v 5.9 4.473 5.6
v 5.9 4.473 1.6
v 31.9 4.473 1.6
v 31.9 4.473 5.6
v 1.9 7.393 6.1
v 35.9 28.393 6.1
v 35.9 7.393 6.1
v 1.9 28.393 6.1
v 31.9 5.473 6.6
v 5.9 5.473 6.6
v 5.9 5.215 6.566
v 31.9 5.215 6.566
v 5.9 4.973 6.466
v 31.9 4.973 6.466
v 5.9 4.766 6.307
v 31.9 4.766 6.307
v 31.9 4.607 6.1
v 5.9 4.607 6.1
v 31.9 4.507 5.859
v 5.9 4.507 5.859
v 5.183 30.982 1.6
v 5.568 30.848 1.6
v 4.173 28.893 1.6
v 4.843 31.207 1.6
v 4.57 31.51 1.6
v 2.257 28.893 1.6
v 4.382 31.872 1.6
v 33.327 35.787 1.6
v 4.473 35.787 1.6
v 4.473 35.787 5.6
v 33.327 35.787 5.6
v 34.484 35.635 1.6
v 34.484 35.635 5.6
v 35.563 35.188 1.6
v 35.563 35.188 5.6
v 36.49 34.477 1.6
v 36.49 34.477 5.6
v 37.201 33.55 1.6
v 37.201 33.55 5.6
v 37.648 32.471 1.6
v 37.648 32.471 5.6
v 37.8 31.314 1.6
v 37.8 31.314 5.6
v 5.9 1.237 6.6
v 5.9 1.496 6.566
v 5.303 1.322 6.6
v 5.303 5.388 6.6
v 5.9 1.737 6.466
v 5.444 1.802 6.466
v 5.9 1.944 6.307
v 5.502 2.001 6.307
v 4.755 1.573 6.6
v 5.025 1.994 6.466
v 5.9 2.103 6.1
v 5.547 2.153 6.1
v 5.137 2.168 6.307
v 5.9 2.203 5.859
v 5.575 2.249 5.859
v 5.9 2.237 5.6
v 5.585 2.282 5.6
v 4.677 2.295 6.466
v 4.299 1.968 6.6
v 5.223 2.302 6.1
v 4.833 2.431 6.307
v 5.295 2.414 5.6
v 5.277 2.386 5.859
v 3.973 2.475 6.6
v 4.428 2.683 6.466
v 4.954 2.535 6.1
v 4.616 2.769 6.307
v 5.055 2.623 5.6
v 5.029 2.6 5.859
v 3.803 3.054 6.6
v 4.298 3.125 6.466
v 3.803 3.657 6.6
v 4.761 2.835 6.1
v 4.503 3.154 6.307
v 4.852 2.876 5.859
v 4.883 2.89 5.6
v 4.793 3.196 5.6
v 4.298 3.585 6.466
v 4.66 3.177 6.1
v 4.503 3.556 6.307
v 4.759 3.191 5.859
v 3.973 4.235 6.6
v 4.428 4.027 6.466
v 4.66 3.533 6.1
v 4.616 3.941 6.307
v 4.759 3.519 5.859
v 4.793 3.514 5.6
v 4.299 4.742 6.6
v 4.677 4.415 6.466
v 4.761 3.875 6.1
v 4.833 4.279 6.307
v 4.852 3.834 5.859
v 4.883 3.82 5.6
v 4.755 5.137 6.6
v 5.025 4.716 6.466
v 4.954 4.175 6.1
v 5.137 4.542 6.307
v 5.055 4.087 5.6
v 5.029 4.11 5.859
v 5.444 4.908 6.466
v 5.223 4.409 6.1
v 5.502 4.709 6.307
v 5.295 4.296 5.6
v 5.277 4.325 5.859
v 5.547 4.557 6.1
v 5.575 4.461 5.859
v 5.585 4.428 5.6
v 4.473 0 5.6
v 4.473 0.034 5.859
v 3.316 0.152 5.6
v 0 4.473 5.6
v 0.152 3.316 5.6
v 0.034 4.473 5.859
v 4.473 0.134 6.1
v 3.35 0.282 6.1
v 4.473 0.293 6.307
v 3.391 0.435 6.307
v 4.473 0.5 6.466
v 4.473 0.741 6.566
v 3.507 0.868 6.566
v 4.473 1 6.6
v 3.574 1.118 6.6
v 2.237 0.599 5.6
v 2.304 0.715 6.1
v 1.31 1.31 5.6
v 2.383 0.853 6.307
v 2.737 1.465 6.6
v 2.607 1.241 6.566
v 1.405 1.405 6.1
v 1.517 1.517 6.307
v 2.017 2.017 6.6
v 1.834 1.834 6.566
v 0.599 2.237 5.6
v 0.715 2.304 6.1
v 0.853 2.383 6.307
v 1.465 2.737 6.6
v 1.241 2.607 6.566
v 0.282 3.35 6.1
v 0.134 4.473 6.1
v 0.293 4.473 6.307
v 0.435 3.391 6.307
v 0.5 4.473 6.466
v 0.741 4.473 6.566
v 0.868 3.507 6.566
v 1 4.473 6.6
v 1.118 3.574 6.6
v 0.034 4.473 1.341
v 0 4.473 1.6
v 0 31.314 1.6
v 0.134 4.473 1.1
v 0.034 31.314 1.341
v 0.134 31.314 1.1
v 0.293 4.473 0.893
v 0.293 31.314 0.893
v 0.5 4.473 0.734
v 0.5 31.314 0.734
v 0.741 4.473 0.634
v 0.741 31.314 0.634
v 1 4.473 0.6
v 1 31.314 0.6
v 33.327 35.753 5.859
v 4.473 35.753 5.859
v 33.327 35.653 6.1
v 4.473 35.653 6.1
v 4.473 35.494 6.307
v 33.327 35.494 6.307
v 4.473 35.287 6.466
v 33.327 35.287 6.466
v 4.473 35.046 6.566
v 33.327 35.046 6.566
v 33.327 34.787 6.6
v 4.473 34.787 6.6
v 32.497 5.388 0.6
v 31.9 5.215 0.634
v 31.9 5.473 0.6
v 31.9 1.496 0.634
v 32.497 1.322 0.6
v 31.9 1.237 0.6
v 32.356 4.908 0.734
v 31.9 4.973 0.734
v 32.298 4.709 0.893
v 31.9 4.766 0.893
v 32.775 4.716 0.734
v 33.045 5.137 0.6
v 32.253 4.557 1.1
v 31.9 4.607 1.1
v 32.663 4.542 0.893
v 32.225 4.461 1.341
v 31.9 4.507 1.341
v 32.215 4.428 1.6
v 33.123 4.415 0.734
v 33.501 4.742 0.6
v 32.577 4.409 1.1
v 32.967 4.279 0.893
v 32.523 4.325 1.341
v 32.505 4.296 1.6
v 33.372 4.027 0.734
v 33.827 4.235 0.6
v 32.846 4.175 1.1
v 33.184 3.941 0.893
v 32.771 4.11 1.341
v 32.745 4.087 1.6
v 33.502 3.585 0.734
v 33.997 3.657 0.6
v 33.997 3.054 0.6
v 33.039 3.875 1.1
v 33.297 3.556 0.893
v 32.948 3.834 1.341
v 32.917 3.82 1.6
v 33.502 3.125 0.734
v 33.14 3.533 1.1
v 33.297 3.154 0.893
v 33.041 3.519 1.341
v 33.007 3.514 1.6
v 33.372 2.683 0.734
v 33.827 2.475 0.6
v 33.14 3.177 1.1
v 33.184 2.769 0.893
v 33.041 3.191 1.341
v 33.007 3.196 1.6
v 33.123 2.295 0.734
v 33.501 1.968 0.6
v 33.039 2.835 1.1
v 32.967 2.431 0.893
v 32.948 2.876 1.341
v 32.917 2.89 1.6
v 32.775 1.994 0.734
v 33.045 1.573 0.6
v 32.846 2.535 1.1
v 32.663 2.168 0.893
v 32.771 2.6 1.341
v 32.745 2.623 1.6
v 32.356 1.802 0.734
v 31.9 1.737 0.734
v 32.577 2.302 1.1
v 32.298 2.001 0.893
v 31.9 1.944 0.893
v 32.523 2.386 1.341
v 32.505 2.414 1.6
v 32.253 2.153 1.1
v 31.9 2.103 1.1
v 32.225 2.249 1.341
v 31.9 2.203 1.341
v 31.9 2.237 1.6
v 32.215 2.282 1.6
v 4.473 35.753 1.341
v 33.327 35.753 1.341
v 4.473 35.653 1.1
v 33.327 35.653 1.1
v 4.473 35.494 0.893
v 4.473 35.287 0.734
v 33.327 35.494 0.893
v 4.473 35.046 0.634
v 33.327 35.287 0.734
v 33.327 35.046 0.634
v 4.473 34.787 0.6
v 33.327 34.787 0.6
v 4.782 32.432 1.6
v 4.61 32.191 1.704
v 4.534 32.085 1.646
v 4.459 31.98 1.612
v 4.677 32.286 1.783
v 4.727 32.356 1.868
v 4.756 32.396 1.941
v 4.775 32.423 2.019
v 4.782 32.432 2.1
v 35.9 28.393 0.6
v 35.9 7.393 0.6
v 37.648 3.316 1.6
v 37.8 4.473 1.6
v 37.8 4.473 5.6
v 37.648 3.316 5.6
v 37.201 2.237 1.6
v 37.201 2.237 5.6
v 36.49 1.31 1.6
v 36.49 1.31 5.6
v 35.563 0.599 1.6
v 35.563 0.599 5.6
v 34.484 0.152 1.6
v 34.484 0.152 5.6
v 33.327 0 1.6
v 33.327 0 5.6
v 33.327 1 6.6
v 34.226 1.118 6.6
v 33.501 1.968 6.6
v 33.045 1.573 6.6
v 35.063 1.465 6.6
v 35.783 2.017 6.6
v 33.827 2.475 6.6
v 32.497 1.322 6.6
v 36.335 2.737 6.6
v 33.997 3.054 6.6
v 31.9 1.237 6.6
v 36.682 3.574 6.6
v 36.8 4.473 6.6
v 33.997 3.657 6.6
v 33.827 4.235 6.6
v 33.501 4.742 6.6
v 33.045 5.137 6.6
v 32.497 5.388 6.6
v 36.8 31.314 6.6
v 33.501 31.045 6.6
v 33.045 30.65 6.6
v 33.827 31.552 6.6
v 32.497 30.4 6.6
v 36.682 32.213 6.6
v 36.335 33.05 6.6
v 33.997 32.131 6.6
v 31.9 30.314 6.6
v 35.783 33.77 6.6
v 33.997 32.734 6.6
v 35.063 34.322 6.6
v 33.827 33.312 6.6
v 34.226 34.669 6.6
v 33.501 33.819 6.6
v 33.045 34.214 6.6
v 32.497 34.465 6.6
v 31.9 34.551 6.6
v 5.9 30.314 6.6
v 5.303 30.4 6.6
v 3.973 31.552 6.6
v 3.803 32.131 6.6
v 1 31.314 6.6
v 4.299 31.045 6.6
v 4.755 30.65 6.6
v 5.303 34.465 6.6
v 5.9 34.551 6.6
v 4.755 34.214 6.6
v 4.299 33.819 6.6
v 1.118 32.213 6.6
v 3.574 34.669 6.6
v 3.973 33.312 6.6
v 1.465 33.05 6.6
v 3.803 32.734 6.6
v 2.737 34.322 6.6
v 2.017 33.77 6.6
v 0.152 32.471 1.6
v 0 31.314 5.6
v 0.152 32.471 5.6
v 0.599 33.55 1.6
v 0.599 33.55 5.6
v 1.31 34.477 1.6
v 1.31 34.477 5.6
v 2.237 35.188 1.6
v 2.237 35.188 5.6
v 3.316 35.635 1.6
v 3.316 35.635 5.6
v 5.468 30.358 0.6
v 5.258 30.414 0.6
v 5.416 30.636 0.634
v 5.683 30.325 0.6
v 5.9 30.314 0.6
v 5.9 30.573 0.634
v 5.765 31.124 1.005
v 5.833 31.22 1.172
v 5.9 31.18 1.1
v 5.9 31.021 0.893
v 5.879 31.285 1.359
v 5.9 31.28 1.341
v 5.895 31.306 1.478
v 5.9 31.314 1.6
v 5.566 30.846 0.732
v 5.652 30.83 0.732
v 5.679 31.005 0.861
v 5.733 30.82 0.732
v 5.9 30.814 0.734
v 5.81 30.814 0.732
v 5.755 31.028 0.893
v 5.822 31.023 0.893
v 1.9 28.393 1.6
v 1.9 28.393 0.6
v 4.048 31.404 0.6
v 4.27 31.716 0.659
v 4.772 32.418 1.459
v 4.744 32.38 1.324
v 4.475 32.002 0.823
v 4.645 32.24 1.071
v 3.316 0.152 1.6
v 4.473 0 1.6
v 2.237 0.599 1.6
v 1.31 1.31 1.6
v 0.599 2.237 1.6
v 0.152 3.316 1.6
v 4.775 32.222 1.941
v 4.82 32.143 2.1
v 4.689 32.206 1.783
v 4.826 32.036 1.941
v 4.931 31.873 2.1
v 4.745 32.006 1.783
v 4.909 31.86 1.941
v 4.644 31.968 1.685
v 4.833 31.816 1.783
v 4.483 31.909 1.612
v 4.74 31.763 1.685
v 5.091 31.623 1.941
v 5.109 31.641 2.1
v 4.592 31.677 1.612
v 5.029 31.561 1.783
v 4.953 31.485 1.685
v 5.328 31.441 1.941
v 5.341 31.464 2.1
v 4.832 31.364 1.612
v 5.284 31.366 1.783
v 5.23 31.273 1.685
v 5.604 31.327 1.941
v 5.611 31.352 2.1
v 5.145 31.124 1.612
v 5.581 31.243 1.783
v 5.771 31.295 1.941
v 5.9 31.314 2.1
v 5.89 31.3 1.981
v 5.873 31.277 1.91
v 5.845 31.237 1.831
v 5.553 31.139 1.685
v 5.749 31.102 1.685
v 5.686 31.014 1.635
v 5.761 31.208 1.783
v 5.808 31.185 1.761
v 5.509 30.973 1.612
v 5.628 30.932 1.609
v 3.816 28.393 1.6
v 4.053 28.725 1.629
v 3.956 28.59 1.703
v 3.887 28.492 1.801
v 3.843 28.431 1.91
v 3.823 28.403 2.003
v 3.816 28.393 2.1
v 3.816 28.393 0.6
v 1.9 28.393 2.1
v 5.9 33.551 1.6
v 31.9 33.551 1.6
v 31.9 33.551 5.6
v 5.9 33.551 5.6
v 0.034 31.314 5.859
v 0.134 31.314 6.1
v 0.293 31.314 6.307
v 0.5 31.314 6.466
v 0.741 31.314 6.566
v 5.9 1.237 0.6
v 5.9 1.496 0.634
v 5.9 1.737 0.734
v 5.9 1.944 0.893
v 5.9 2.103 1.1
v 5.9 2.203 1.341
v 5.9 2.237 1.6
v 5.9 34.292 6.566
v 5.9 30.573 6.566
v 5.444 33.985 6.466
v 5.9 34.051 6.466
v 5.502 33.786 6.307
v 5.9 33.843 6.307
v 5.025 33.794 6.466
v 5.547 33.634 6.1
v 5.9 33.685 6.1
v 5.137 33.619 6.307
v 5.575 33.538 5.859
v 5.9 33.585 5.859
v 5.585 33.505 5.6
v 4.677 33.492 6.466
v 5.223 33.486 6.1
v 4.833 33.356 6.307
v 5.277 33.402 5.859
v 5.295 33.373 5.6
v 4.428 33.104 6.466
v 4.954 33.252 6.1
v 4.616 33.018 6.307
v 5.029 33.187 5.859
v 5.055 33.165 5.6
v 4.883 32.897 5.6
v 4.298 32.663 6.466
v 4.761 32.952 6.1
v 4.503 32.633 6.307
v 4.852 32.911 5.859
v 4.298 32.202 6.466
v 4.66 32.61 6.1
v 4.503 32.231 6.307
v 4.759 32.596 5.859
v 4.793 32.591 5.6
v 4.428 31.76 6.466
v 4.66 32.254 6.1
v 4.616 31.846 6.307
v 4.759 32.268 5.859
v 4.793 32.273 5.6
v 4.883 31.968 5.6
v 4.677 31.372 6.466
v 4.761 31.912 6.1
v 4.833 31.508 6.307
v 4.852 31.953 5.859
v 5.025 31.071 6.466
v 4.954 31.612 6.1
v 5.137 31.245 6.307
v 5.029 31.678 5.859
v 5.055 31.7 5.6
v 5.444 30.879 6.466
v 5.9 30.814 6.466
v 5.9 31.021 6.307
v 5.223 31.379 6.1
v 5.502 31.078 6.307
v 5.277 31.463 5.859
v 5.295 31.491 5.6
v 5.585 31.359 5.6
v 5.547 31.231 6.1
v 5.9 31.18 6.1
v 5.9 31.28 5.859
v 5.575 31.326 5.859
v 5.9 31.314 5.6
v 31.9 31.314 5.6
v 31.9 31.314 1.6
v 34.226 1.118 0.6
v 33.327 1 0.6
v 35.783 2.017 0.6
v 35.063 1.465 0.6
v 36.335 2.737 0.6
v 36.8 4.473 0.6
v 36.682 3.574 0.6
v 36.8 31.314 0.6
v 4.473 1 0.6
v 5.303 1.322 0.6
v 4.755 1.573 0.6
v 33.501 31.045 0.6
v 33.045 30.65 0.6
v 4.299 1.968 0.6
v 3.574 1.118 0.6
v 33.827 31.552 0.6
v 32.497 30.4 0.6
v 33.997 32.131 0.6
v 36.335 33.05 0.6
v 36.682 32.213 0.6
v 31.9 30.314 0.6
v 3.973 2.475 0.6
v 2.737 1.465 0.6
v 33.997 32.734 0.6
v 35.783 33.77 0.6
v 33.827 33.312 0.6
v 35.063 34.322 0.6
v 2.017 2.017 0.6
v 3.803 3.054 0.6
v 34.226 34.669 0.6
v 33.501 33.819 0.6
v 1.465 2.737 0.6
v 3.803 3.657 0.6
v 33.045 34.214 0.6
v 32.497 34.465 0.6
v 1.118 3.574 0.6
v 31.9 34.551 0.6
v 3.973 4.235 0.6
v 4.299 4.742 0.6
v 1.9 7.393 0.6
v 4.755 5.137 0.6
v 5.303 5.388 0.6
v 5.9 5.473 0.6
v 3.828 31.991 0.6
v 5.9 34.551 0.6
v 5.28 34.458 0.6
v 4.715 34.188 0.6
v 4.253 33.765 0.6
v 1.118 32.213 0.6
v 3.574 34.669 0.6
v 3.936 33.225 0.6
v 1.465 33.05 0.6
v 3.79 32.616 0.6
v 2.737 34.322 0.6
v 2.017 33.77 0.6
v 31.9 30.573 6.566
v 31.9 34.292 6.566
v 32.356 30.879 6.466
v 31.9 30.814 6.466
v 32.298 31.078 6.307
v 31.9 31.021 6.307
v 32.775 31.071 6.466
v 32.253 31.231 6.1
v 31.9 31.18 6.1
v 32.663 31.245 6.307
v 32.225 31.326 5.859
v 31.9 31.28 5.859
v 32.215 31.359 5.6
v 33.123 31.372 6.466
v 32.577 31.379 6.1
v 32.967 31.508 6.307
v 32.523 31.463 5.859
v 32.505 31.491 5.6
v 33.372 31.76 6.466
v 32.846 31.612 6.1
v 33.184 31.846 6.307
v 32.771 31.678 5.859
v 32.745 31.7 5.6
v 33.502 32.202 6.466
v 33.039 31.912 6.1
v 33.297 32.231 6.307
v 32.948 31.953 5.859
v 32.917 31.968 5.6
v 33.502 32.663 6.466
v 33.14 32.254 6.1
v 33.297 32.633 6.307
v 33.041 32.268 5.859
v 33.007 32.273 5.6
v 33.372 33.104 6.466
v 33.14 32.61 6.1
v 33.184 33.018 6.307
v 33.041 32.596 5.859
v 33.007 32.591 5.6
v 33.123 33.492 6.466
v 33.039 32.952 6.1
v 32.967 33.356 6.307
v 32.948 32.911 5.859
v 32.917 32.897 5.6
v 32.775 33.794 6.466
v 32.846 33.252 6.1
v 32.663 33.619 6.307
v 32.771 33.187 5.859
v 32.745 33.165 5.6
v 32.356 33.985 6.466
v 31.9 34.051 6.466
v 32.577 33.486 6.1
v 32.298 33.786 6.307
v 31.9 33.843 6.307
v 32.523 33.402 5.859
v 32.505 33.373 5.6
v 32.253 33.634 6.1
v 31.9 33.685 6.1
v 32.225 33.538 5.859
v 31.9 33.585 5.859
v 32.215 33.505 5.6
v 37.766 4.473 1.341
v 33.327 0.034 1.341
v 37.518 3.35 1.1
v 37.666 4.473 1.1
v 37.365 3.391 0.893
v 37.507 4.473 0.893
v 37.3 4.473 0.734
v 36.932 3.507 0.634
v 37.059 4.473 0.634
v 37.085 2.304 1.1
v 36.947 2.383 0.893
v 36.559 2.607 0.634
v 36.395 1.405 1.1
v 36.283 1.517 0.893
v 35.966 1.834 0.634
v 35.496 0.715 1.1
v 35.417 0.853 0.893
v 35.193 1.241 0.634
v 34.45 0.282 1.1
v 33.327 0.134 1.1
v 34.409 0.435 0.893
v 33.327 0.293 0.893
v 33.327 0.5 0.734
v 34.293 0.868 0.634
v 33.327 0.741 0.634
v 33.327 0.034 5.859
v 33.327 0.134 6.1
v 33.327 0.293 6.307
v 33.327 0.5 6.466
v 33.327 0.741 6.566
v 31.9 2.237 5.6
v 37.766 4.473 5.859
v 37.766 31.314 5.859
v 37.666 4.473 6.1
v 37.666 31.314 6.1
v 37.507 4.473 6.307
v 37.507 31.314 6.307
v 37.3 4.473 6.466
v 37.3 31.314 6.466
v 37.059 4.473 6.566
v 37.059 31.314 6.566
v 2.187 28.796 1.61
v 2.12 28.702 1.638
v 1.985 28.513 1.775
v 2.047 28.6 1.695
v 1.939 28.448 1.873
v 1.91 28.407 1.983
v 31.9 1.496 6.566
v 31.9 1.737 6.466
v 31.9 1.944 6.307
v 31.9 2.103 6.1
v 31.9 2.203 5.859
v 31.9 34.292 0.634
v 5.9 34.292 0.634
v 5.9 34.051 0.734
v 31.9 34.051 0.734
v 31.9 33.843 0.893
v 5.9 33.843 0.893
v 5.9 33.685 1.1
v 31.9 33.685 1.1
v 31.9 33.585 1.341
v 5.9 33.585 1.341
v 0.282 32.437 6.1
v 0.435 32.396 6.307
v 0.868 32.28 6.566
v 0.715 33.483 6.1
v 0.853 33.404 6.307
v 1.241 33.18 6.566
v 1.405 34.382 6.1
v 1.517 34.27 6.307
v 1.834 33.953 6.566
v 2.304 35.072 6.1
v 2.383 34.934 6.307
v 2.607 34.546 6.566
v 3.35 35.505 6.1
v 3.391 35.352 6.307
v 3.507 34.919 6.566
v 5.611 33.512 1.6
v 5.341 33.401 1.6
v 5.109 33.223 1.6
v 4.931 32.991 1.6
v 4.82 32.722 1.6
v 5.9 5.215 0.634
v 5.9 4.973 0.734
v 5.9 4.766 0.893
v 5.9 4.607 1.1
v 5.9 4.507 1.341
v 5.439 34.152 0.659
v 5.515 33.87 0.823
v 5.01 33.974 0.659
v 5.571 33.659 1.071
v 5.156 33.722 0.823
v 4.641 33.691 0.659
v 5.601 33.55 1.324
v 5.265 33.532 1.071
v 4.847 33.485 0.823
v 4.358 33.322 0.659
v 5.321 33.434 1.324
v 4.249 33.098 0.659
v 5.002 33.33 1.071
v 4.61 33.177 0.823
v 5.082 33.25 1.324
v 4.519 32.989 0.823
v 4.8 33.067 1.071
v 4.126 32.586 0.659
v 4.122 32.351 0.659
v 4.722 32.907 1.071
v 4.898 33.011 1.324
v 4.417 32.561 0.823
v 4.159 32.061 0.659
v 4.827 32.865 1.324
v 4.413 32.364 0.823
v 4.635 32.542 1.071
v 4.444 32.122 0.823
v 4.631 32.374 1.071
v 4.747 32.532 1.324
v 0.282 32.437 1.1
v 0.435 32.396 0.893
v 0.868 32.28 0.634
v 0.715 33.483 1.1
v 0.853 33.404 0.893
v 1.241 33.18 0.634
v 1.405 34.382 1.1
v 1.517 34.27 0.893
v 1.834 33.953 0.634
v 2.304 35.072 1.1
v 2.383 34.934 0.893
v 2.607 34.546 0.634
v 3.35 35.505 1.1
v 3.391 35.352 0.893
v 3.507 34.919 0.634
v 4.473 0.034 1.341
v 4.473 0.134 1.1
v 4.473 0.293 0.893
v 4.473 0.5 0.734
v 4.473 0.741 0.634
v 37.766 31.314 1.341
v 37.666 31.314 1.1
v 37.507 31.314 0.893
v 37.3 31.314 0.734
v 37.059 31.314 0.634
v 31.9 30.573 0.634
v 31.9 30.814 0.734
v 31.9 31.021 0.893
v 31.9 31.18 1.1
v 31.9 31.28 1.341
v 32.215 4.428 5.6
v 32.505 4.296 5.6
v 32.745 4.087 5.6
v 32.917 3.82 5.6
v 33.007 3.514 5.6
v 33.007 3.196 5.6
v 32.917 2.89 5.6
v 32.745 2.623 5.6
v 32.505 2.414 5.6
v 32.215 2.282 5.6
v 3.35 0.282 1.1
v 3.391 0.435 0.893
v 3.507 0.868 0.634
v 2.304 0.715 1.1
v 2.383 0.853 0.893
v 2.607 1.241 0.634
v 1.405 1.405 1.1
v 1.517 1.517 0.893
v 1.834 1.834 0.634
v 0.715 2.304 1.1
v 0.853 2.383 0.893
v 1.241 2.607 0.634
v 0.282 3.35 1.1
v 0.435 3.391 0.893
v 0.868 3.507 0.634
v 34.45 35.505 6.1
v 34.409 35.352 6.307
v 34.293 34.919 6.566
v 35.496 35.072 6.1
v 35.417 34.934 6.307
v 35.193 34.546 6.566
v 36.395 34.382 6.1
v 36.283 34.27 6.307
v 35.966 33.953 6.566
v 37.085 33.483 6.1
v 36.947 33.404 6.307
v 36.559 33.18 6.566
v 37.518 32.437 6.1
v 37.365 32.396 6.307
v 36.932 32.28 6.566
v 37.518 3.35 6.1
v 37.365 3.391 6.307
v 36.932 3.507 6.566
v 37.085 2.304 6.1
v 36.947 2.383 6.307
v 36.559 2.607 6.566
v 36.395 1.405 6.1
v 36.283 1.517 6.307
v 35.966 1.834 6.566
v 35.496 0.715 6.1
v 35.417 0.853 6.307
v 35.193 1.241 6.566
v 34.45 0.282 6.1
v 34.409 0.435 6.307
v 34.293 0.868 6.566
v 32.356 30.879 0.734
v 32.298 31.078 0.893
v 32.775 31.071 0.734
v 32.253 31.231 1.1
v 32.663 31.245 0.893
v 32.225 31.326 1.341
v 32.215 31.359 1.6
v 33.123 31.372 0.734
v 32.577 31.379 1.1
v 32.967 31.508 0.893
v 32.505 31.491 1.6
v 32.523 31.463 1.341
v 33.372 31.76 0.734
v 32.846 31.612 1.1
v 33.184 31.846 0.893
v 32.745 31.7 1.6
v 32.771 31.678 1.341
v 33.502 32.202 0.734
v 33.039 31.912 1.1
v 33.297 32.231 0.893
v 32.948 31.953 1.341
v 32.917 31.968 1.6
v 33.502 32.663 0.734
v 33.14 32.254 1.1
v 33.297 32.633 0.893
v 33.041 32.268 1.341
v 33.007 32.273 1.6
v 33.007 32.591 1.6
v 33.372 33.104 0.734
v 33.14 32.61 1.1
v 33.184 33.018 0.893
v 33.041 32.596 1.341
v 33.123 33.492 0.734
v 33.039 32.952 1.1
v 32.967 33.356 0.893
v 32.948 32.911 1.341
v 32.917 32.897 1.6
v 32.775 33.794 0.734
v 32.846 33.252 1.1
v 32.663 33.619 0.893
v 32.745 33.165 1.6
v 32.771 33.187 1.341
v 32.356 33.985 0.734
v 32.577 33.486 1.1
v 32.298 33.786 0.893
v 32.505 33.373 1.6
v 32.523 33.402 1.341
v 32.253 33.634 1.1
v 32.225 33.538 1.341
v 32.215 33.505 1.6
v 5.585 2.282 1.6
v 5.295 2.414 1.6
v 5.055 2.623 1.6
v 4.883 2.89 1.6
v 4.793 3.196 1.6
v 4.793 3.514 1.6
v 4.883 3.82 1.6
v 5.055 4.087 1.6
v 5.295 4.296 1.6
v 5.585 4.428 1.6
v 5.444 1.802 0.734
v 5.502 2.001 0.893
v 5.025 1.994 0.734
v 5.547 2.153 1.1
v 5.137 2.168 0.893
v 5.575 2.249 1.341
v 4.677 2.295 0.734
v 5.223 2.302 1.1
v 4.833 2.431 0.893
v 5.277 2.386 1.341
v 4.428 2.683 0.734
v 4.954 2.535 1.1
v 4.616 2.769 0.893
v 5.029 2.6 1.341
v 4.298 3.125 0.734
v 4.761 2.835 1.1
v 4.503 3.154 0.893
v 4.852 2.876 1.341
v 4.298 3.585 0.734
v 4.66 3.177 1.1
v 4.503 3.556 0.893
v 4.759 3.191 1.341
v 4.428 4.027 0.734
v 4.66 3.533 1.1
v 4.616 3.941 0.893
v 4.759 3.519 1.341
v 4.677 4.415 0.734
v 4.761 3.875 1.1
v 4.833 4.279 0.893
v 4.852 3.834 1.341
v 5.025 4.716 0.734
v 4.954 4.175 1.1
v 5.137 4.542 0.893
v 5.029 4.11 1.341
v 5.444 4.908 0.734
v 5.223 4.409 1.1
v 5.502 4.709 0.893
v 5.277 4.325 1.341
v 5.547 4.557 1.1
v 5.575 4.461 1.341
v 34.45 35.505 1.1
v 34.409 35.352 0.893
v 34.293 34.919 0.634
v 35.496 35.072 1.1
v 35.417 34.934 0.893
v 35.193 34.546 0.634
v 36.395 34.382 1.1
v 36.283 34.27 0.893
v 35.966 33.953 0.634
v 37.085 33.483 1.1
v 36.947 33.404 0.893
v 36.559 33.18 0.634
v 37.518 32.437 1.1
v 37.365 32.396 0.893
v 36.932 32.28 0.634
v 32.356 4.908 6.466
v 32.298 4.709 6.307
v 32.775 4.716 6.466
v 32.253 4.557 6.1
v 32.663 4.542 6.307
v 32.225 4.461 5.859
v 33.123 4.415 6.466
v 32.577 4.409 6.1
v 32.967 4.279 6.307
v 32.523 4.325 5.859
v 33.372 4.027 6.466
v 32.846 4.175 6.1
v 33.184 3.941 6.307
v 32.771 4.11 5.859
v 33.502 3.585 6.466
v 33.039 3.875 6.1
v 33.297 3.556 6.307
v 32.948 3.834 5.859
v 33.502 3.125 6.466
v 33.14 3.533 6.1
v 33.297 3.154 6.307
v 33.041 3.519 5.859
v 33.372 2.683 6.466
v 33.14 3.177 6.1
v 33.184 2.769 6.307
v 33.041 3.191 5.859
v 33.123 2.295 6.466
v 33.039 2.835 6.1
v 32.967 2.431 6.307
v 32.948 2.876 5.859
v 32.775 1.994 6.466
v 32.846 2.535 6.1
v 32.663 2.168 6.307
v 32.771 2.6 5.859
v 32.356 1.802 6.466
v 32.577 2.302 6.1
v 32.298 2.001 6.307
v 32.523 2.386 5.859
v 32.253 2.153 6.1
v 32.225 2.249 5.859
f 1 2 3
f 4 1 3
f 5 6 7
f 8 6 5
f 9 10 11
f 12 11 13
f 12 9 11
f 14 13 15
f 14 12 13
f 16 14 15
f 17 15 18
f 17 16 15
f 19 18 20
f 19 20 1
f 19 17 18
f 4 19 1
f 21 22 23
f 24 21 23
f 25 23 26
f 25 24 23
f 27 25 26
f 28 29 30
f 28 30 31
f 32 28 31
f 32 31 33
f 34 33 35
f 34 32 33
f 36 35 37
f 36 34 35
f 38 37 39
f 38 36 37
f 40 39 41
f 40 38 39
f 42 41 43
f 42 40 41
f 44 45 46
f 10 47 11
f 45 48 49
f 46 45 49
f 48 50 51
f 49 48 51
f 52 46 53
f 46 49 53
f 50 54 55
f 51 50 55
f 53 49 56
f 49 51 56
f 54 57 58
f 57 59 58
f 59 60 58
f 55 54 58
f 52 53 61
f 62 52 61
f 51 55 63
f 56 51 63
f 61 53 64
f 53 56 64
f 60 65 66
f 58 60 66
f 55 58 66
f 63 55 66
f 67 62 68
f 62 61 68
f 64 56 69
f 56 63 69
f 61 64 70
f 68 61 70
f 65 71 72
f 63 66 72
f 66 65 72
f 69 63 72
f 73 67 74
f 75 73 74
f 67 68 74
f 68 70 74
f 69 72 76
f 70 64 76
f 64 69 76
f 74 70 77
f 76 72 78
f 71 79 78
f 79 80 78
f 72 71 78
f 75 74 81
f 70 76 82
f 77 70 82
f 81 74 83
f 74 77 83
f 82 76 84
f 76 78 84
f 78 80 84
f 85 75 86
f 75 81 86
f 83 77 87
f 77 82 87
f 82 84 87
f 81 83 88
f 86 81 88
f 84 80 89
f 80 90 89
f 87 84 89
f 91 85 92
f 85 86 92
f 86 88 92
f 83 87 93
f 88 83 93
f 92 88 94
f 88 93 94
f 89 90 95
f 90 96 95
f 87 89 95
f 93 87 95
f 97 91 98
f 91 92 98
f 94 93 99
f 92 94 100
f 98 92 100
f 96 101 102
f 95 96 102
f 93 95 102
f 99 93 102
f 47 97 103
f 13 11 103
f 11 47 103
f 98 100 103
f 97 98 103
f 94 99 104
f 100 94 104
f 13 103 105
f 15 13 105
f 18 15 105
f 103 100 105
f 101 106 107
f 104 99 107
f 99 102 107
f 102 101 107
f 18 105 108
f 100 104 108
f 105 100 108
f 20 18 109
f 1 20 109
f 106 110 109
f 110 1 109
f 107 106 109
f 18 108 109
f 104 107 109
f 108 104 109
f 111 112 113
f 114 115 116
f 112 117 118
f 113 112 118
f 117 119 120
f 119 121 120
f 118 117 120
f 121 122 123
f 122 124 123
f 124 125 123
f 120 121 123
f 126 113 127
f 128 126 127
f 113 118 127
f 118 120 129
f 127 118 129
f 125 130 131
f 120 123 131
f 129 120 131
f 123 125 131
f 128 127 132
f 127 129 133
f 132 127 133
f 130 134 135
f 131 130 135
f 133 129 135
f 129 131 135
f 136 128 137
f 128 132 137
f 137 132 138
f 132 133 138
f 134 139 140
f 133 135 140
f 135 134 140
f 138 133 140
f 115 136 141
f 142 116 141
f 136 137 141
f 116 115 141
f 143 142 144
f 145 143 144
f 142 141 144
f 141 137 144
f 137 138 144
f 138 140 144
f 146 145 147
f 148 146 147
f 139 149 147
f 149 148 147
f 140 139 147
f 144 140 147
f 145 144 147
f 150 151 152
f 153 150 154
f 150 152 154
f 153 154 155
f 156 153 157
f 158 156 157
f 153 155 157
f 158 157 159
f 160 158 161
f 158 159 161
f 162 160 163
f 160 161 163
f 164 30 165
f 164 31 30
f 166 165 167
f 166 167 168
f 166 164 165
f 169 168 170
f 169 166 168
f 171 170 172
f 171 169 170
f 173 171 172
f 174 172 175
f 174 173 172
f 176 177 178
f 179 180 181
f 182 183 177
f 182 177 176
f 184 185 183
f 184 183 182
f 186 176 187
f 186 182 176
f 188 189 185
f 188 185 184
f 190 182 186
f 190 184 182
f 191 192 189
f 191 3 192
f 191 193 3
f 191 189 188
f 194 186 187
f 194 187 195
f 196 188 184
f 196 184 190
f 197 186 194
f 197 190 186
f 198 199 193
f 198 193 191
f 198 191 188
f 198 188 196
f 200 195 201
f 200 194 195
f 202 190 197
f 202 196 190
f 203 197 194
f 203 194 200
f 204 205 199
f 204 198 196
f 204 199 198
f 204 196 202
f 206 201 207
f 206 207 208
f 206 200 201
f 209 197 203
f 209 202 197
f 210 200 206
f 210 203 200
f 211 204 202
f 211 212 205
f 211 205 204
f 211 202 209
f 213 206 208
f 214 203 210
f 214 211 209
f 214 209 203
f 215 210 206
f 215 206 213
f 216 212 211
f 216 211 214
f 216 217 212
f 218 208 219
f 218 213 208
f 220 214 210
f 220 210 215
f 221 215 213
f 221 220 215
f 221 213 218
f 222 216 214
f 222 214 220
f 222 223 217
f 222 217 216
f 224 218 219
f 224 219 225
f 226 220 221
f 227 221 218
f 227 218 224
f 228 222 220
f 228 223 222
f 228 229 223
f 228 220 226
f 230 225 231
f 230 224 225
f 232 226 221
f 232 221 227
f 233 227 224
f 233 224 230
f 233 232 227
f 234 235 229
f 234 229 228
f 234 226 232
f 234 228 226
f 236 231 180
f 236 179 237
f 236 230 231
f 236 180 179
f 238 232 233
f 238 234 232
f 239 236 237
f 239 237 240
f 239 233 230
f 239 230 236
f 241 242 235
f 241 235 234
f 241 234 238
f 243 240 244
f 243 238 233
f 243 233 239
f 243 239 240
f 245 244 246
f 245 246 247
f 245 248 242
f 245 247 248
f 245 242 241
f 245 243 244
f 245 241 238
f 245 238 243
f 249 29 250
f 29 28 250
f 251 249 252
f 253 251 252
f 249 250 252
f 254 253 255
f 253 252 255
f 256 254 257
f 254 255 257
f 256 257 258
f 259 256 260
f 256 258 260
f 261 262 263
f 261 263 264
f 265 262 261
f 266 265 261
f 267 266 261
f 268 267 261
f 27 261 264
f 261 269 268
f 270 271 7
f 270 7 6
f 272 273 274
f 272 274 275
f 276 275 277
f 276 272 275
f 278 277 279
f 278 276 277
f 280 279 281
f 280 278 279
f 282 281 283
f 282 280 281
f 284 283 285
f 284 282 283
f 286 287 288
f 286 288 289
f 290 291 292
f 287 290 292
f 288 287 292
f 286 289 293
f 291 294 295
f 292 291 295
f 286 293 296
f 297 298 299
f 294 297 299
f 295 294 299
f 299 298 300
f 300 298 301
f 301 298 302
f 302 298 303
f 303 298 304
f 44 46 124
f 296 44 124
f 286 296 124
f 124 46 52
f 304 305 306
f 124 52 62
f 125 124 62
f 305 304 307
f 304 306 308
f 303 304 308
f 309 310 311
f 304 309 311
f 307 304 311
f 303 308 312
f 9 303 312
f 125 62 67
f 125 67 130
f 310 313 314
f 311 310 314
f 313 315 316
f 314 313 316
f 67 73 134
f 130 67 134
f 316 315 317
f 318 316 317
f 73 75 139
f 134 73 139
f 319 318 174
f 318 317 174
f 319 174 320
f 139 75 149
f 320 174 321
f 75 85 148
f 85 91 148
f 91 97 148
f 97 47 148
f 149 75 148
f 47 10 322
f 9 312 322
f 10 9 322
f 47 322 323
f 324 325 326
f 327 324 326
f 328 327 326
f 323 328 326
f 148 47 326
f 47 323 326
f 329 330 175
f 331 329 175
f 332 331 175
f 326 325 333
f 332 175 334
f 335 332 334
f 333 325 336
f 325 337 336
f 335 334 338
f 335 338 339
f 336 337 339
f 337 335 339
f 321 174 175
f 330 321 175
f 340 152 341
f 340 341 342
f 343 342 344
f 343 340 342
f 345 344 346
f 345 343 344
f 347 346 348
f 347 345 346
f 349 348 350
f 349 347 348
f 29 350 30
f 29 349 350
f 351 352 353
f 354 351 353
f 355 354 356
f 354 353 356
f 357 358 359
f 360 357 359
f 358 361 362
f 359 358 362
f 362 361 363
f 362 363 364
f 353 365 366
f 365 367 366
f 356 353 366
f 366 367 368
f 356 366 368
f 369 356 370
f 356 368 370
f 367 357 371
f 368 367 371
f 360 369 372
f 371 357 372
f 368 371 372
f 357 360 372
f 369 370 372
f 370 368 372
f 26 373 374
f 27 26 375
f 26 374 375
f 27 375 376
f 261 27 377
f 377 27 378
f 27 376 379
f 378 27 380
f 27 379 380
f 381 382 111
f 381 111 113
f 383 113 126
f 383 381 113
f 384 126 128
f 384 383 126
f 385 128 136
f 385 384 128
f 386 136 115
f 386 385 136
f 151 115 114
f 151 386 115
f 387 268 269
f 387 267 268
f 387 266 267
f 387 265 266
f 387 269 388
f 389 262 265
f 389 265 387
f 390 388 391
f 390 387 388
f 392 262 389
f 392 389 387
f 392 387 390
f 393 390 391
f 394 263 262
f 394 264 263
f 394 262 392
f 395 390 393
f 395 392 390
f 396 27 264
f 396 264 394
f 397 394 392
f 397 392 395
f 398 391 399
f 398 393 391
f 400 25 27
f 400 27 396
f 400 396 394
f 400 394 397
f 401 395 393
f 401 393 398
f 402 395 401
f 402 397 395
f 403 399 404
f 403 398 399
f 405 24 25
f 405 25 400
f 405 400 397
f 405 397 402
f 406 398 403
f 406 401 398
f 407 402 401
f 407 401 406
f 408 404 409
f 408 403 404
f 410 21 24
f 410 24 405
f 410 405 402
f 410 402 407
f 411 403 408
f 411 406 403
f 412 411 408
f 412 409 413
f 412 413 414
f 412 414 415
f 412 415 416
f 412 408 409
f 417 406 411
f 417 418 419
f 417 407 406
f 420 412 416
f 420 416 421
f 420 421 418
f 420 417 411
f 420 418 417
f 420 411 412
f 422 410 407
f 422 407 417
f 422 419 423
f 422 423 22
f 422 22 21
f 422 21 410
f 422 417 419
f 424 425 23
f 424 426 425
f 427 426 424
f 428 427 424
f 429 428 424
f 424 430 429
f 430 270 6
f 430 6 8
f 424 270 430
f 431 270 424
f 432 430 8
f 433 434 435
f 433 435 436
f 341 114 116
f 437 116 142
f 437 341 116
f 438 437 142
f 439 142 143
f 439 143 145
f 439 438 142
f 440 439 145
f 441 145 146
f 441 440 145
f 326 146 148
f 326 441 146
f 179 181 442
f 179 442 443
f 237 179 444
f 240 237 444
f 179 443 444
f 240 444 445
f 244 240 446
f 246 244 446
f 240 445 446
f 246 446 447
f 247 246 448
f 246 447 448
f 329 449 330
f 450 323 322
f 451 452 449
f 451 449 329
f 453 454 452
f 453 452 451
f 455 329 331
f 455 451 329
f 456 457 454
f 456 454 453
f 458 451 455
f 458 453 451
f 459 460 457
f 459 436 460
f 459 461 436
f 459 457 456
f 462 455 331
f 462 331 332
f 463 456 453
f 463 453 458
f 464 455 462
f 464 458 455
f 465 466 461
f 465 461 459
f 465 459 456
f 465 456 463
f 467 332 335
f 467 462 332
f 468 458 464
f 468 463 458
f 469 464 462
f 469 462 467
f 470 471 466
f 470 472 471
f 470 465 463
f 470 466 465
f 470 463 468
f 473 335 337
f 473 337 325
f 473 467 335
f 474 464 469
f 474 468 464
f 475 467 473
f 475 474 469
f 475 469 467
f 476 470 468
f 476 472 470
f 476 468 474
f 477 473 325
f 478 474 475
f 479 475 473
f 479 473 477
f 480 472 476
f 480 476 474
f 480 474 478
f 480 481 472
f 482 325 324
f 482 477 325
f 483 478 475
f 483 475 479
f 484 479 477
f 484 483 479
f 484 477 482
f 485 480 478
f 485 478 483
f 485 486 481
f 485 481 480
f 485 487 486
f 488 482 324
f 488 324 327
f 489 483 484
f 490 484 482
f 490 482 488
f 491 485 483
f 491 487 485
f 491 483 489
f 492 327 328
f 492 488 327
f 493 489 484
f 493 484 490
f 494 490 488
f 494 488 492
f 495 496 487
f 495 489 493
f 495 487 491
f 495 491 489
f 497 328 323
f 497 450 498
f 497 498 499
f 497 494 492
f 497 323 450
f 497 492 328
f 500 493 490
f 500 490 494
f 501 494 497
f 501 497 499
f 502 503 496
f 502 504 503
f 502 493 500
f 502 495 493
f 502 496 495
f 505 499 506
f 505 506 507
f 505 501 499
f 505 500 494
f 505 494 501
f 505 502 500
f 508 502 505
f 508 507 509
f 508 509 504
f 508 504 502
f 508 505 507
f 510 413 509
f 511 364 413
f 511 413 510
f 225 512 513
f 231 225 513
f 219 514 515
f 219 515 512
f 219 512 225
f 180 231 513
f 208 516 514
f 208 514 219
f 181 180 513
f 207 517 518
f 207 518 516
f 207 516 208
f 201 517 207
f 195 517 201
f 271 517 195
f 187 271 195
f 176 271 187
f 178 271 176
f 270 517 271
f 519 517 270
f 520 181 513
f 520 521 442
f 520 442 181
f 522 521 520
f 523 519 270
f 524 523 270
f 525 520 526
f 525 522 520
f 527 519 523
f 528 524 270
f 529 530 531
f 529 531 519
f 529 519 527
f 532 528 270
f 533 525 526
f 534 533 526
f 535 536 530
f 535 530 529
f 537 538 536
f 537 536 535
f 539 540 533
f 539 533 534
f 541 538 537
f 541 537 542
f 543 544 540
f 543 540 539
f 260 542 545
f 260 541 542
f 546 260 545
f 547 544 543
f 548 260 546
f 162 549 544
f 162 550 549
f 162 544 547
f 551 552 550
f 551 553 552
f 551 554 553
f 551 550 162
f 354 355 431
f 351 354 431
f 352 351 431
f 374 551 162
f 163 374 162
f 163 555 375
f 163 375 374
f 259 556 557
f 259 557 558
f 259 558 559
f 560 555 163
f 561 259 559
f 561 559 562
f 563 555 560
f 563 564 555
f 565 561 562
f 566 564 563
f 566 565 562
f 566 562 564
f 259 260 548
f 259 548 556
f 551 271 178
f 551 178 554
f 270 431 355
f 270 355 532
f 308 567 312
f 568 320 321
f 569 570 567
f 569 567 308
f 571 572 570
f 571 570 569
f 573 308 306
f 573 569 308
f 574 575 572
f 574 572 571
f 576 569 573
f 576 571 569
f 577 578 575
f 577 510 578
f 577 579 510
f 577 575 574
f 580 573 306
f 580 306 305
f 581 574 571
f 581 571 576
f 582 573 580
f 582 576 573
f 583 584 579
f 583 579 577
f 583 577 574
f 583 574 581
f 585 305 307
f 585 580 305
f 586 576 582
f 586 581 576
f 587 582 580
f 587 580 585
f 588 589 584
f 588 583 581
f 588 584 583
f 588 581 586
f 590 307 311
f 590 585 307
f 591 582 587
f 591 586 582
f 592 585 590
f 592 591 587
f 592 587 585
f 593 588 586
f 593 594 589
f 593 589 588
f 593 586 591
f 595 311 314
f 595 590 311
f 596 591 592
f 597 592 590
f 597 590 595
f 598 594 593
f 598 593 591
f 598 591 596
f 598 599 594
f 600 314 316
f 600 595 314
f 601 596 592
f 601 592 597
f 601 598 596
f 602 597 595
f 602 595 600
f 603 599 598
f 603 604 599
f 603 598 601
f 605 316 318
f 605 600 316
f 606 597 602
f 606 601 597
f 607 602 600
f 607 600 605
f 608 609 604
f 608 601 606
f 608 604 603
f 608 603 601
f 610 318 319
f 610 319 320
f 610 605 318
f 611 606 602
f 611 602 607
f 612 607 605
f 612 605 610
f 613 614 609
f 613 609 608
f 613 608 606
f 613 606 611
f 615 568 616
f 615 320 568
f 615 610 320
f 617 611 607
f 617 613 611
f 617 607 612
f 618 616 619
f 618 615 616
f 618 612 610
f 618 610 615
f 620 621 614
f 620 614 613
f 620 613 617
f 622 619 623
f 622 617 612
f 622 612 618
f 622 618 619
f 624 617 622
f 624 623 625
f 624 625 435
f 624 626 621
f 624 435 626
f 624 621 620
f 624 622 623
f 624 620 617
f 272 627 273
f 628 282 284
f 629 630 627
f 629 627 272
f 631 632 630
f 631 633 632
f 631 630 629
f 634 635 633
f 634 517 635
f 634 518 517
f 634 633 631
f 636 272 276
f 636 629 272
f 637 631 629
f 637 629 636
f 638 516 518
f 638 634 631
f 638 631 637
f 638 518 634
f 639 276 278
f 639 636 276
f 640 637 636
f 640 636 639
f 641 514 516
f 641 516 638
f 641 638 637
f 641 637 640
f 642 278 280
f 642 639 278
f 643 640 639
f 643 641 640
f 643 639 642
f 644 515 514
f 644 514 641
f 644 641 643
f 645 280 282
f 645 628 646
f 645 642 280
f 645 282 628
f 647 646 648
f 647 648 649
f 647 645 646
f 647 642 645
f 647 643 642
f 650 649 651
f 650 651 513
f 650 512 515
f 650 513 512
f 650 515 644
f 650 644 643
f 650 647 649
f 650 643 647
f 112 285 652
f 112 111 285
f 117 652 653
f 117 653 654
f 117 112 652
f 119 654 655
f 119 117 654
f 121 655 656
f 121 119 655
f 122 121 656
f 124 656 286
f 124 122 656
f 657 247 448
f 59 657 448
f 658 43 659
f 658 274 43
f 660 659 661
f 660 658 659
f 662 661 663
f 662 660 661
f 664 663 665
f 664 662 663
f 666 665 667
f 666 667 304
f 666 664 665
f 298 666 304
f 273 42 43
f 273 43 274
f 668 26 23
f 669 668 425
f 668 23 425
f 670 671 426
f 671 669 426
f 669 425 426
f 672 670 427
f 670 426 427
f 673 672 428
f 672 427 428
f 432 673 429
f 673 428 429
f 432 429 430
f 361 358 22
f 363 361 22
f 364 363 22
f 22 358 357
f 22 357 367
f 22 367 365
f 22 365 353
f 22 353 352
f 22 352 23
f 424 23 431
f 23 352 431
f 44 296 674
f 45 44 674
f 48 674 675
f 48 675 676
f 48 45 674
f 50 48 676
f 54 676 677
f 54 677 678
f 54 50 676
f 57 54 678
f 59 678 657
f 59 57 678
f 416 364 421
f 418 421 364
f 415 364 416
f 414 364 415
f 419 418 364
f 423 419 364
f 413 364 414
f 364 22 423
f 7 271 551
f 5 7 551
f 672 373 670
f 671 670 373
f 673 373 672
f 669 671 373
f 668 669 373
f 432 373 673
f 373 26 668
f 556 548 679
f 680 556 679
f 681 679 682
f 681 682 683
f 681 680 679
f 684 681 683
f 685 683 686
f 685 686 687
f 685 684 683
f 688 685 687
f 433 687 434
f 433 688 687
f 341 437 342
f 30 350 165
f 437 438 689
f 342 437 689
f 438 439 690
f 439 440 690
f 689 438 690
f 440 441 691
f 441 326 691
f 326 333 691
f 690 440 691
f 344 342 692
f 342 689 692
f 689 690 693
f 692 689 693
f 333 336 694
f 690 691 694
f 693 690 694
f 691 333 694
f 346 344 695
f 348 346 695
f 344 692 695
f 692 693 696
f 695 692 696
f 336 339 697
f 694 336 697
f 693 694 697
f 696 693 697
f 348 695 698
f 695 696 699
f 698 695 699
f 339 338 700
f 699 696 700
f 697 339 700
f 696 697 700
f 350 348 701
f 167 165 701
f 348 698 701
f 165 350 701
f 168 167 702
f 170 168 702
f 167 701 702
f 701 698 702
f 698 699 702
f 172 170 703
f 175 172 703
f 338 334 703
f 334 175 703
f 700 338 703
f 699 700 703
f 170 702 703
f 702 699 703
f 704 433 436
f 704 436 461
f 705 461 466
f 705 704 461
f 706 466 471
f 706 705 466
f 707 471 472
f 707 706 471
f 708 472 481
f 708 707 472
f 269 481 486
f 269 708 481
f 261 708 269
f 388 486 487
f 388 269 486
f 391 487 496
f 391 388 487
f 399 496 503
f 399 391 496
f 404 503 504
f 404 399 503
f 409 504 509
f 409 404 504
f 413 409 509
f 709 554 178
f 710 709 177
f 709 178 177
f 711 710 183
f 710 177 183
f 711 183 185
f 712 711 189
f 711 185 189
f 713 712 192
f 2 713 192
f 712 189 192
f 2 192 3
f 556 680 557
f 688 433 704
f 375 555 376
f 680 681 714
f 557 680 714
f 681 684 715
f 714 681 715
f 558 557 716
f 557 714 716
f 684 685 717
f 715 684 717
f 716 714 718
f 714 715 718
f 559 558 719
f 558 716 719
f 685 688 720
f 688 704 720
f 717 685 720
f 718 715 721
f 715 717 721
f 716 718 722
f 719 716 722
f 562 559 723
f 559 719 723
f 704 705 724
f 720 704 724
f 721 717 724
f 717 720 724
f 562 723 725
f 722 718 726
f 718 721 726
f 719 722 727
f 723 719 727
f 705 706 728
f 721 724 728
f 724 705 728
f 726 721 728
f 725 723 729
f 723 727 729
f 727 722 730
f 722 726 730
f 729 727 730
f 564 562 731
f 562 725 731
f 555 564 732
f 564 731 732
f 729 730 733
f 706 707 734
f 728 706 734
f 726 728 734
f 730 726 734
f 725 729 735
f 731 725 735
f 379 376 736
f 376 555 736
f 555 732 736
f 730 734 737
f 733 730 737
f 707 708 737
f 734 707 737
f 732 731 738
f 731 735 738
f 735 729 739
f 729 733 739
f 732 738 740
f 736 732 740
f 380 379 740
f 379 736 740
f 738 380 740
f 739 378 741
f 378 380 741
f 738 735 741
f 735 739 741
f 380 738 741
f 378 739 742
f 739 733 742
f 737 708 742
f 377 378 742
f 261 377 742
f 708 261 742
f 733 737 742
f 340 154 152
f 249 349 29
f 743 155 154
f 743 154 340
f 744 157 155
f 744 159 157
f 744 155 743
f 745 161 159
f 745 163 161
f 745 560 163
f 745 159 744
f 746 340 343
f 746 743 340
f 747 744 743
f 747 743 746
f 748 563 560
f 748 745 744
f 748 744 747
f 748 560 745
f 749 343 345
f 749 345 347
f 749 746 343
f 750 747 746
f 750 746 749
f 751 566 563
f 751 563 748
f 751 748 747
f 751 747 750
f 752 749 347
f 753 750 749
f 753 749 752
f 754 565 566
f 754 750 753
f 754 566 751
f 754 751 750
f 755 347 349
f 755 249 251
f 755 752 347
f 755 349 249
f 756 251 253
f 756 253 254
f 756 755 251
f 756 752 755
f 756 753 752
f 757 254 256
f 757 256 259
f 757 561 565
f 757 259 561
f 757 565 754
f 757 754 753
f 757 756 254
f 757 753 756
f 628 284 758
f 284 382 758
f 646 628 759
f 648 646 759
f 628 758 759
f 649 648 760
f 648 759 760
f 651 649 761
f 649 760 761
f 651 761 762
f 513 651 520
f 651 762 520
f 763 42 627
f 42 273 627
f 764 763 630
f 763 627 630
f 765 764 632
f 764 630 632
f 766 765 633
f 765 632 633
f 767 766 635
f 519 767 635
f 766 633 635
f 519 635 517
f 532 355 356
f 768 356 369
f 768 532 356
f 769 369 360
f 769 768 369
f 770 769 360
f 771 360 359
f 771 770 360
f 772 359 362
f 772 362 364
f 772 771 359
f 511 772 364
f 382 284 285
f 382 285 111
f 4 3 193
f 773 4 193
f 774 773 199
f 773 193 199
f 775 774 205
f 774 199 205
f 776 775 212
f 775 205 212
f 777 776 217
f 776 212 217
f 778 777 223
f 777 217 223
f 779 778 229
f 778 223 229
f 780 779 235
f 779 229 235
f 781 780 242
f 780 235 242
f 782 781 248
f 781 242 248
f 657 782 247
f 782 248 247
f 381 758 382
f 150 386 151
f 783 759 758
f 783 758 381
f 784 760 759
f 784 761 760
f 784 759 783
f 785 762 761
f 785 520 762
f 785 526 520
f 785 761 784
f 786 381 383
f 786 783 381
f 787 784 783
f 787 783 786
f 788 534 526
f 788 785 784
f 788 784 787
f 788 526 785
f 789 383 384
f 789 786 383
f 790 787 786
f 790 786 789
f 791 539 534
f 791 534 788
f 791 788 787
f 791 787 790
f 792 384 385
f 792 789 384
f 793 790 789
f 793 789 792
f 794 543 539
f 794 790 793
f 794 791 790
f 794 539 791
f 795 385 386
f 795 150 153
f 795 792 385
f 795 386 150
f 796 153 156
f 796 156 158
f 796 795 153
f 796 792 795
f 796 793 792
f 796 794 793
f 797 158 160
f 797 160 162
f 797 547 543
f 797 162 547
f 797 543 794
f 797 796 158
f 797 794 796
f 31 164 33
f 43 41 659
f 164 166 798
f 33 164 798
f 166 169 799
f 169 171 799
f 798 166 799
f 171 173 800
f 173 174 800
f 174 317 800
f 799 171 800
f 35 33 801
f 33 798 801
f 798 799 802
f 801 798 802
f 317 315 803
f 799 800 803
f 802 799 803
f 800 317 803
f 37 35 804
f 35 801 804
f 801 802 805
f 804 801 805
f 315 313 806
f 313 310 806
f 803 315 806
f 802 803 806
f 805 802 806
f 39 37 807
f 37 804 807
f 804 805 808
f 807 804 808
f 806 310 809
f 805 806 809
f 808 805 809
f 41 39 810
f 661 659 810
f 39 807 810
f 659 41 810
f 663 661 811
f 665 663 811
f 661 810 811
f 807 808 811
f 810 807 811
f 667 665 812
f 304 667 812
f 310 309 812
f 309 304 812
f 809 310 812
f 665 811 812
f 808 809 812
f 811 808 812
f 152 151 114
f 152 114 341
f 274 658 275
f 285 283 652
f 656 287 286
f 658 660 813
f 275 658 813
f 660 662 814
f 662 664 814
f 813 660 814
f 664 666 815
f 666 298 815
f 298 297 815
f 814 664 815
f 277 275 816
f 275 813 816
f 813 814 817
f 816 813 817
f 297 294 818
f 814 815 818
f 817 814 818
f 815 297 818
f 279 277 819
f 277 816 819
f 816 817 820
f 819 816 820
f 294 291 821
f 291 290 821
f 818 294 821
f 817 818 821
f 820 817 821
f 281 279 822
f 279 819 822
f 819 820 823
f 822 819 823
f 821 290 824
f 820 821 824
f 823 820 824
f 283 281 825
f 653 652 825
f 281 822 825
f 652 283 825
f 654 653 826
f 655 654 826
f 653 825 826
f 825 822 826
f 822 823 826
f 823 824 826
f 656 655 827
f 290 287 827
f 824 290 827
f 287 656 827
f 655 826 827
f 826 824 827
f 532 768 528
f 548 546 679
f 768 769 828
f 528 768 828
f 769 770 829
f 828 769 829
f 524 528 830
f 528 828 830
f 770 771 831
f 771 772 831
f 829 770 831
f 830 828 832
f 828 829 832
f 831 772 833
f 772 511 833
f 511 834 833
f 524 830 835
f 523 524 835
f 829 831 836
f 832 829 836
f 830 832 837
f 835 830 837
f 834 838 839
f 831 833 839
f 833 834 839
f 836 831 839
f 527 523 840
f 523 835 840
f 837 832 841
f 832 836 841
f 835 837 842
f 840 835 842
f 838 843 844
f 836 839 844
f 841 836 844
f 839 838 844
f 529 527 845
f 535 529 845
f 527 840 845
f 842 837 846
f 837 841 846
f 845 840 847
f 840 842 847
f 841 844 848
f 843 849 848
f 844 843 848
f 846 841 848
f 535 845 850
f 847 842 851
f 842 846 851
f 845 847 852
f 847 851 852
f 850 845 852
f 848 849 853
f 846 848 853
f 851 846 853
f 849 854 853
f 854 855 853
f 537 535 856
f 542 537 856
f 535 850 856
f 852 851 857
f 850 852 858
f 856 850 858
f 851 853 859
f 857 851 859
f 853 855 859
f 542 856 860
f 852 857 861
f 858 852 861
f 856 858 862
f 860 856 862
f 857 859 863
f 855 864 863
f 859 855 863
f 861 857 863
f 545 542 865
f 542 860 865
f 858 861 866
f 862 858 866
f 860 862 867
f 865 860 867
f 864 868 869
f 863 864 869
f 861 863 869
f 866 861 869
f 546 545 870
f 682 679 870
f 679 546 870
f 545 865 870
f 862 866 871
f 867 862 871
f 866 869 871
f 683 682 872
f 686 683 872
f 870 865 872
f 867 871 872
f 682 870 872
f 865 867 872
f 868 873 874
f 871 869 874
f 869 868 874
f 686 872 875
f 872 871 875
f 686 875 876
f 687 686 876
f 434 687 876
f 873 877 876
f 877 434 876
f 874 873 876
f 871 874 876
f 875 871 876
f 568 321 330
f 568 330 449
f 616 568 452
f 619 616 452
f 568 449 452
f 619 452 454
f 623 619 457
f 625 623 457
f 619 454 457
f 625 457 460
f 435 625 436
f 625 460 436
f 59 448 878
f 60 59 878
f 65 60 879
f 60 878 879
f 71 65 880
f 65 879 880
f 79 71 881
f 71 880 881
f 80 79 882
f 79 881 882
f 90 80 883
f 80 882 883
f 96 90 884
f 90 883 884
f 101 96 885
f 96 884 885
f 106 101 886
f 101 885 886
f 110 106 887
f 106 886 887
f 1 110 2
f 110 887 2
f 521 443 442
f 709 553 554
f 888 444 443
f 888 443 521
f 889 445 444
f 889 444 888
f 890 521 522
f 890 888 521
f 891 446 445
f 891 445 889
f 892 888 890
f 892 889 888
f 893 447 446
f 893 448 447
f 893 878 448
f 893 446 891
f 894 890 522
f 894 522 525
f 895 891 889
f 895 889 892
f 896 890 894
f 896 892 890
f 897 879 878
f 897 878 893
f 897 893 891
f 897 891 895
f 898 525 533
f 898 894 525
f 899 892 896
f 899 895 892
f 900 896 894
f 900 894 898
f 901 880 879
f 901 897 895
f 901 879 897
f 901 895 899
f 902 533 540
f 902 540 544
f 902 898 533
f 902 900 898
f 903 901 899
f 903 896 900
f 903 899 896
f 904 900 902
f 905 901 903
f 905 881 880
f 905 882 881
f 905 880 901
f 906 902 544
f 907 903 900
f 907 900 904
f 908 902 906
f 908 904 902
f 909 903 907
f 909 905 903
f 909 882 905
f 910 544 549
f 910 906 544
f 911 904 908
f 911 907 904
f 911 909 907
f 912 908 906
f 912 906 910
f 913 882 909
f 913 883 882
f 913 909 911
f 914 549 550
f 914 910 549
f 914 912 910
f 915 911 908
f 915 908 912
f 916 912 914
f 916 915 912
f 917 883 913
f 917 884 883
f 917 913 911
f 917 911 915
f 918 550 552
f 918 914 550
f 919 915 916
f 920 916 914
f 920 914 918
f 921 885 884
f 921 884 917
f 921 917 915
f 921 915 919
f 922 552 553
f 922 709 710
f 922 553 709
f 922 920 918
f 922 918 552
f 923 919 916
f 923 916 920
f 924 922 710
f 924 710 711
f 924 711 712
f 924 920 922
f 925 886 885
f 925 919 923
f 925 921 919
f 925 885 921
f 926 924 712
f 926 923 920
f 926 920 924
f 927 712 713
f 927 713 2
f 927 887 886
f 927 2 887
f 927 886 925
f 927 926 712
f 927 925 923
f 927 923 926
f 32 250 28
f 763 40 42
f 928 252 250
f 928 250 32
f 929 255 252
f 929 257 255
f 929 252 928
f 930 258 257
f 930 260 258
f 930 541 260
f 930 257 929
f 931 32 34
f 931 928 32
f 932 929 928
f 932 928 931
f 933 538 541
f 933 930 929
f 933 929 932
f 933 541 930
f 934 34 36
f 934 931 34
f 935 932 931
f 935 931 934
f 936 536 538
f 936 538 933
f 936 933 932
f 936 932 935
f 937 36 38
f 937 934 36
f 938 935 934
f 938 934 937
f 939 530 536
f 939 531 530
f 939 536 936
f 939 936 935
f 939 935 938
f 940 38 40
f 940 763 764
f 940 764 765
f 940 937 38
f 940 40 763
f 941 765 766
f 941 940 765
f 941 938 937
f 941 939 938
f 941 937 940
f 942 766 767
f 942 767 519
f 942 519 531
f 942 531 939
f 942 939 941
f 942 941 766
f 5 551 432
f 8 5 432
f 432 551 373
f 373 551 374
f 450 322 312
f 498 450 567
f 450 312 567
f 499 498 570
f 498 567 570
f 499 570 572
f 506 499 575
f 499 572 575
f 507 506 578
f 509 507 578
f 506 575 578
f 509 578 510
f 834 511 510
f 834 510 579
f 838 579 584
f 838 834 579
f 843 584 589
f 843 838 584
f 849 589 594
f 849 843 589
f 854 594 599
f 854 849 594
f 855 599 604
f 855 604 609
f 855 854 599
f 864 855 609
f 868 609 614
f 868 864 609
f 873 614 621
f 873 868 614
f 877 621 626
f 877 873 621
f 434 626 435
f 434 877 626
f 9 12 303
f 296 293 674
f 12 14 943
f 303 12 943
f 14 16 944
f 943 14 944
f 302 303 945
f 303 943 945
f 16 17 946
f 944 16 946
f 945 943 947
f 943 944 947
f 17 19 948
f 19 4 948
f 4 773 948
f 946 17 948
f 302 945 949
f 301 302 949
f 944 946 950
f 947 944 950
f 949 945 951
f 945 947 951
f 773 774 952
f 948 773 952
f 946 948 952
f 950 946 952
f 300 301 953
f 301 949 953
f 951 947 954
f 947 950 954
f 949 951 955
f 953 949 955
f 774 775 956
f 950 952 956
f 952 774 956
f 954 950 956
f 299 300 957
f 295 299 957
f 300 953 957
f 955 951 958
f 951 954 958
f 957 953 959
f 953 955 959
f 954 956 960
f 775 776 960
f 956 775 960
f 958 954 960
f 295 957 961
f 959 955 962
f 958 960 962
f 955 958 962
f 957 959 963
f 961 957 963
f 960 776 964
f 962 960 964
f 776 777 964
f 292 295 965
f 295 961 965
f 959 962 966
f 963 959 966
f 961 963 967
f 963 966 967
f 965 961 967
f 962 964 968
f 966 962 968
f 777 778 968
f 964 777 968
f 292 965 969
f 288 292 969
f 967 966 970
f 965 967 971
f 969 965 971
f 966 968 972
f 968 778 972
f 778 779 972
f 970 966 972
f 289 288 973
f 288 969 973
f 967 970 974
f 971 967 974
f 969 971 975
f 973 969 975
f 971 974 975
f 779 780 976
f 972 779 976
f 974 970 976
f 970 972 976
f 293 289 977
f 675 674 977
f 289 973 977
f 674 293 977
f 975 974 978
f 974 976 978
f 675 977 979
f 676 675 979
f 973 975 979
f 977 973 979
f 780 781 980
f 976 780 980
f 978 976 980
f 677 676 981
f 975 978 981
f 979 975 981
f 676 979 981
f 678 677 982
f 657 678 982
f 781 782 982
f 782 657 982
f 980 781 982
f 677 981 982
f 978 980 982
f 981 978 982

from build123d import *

# Parameters (mm, degrees)
BOSS_EXTRUDE1_DEPTH = 6
SKETCH2_W           = 34
SKETCH2_H           = 21
CUT_EXTRUDE1_DEPTH  = 5.5
FILLET1_R           = 1
CUT_EXTRUDE2_DEPTH  = 1
FILLET2_R           = 0.5


with BuildPart() as part:
    # Sketch1 → Boss-Extrude1 (new body)
    with BuildSketch(Plane(origin=(0, 0, 0.6), x_dir=(-1, 0, 0), z_dir=(0, 0, -1))):
        with BuildLine():
            Line((-4.473372781, 35.786982249), (-33.326627219, 35.786982249))
            ThreePointArc((-33.326627219, 35.786982249), (-36.489779447, 34.476761696), (-37.8, 31.313609467))
            Line((-37.8, 31.313609467), (-37.8, 4.473372781))
            ThreePointArc((-37.8, 4.473372781), (-36.489779447, 1.310220553), (-33.326627219, 0))
            Line((-33.326627219, 0), (-4.473372781, 0))
            ThreePointArc((-4.473372781, 0), (-1.310220553, 1.310220553), (0, 4.473372781))
            Line((0, 4.473372781), (0, 31.313609467))
            ThreePointArc((0, 31.313609467), (-1.310220553, 34.476761696), (-4.473372781, 35.786982249))
        make_face()
        with BuildLine():
            Line((-5.9, 4.473372781), (-31.9, 4.473372781))
            ThreePointArc((-31.9, 4.473372781), (-33.018343195, 3.355029586), (-31.9, 2.236686391))
            Line((-31.9, 2.236686391), (-5.9, 2.236686391))
            ThreePointArc((-5.9, 2.236686391), (-4.781656805, 3.355029586), (-5.9, 4.473372781))
        make_face(mode=Mode.SUBTRACT)
        with BuildLine():
            Line((-5.9, 31.31385603), (-31.9, 31.31385603))
            ThreePointArc((-31.9, 31.31385603), (-33.018343195, 32.432199225), (-31.9, 33.550542421))
            Line((-31.9, 33.550542421), (-5.9, 33.550542421))
            ThreePointArc((-5.9, 33.550542421), (-4.781656805, 32.432199225), (-5.9, 31.31385603))
        make_face(mode=Mode.SUBTRACT)
    extrude(amount=-BOSS_EXTRUDE1_DEPTH)

    # Sketch2 → Cut-Extrude1 (cut)
    with BuildSketch(Plane(origin=(0, 0, 0.6), x_dir=(-1, 0, 0), z_dir=(0, 0, -1))):
        with Locations((-18.9, 17.893491124)):
            Rectangle(SKETCH2_W, SKETCH2_H)
    extrude(amount=-CUT_EXTRUDE1_DEPTH, mode=Mode.SUBTRACT)

    # Fillet1
    fillet1_edges = [part.edges().sort_by_distance(p)[0] for p in [
        (36.489779447, 34.476761696, 6.6),
        (18.9, 35.786982249, 0.6),
        (1.310220553, 34.476761696, 0.6),
        (37.8, 17.893491124, 6.6),
        (36.489779447, 1.310220553, 6.6),
        (18.9, 0, 6.6),
        (1.310220553, 1.310220553, 6.6),
        (4.781656805, 3.355029586, 6.6),
        (18.9, 2.236686391, 6.6),
        (33.018343195, 3.355029586, 6.6),
        (18.9, 4.473372781, 6.6),
        (0, 17.893491124, 6.6),
        (4.781656805, 3.355029586, 0.6),
        (18.9, 4.473372781, 0.6),
        (33.018343195, 3.355029586, 0.6),
        (18.9, 2.236686391, 0.6),
        (4.781656805, 32.432199225, 6.6),
        (18.9, 31.31385603, 6.6),
        (33.018343195, 32.432199225, 6.6),
        (18.9, 33.550542421, 6.6),
        (4.781656805, 32.432199225, 0.6),
        (18.9, 33.550542421, 0.6),
        (33.018343195, 32.432199225, 0.6),
        (18.9, 31.31385603, 0.6),
        (1.310220553, 34.476761696, 6.6),
        (18.9, 35.786982249, 6.6),
        (0, 17.893491124, 0.6),
        (1.310220553, 1.310220553, 0.6),
        (18.9, 0, 0.6),
        (36.489779447, 1.310220553, 0.6),
        (37.8, 17.893491124, 0.6),
        (36.489779447, 34.476761696, 0.6),
    ]]
    fillet(fillet1_edges, radius=FILLET1_R)

    # Sketch3 → Cut-Extrude2 (cut)
    with BuildSketch(Plane(origin=(0, 0, 0.6), x_dir=(-1, 0, 0), z_dir=(0, 0, -1))):
        Polygon((-1.9, 28.393491124), (-4.781656805, 32.432199225), (-5.9, 31.31385603), (-3.816291747, 28.393491124), align=None)
    extrude(amount=-CUT_EXTRUDE2_DEPTH, mode=Mode.SUBTRACT)

    # Fillet2
    # the kernel refuses this fillet: 0.5 mm, written as the material it takes off along each edge
    with BuildSketch(Plane(origin=(5.066291747, 28.393491124, 1.6), x_dir=(0, 0, 1), z_dir=(-1, 0, 0))) as fillet2_piece_1_section:
        with BuildLine():
            CenterArc((FILLET2_R, FILLET2_R), FILLET2_R, 180, 90)
            Line((0, FILLET2_R), (0, 0))
            Line((0, 0), (FILLET2_R, 0))
        make_face()
    fillet2_piece_1 = extrude(amount=4.416291747, mode=Mode.PRIVATE)
    fillet2_piece_1 = split(fillet2_piece_1, bisect_by=Plane(origin=(2.302919603, 28.958192189, 1.711683969), z_dir=(0.8140321982584601, -0.5808197484577287, 0)), keep=Keep.TOP, mode=Mode.PRIVATE)
    fillet2_piece_1 = split(fillet2_piece_1, bisect_by=Plane(origin=(3.572747301, 28.052157998, 1.711683969), z_dir=(-0.8140321982584605, 0.5808197484577283, 0)), keep=Keep.TOP, mode=Mode.PRIVATE)
    add(fillet2_piece_1, mode=Mode.SUBTRACT)
    with BuildSketch(Plane(origin=(5.9, 32.432199225, 1.6), x_dir=(-0.4373254221081723, 0.8993033276808826, 0), z_dir=(0.8993033276808826, 0.4373254221081723, 0))) as fillet2_piece_2_section:
        with BuildLine():
            CenterArc((1.118343195 + FILLET2_R, FILLET2_R), FILLET2_R, 180, 90)
            Line((1.118343195, FILLET2_R), (1.118343195, 0))
            Line((1.118343195, 0), (1.118343195 + FILLET2_R, 0))
        make_face()
    fillet2_piece_2 = revolve(axis=Axis((5.9, 32.432199225, 1.6), (0, 0, 1)), revolution_arc=218.133286673, mode=Mode.PRIVATE)
    fillet2_piece_2 = split(fillet2_piece_2, bisect_by=Plane(origin=(4.510634251, 32.0523549, 1.691521123), z_dir=(0.8140321982584601, -0.5808197484577287, 0)), keep=Keep.TOP, mode=Mode.PRIVATE)
    fillet2_piece_2 = split(fillet2_piece_2, bisect_by=Plane(origin=(5.780461948, 31.146320709, 1.691521123), z_dir=(-0.8140321982584605, 0.5808197484577283, 0)), keep=Keep.TOP, mode=Mode.PRIVATE)
    add(fillet2_piece_2, mode=Mode.SUBTRACT)


solid = part.part
